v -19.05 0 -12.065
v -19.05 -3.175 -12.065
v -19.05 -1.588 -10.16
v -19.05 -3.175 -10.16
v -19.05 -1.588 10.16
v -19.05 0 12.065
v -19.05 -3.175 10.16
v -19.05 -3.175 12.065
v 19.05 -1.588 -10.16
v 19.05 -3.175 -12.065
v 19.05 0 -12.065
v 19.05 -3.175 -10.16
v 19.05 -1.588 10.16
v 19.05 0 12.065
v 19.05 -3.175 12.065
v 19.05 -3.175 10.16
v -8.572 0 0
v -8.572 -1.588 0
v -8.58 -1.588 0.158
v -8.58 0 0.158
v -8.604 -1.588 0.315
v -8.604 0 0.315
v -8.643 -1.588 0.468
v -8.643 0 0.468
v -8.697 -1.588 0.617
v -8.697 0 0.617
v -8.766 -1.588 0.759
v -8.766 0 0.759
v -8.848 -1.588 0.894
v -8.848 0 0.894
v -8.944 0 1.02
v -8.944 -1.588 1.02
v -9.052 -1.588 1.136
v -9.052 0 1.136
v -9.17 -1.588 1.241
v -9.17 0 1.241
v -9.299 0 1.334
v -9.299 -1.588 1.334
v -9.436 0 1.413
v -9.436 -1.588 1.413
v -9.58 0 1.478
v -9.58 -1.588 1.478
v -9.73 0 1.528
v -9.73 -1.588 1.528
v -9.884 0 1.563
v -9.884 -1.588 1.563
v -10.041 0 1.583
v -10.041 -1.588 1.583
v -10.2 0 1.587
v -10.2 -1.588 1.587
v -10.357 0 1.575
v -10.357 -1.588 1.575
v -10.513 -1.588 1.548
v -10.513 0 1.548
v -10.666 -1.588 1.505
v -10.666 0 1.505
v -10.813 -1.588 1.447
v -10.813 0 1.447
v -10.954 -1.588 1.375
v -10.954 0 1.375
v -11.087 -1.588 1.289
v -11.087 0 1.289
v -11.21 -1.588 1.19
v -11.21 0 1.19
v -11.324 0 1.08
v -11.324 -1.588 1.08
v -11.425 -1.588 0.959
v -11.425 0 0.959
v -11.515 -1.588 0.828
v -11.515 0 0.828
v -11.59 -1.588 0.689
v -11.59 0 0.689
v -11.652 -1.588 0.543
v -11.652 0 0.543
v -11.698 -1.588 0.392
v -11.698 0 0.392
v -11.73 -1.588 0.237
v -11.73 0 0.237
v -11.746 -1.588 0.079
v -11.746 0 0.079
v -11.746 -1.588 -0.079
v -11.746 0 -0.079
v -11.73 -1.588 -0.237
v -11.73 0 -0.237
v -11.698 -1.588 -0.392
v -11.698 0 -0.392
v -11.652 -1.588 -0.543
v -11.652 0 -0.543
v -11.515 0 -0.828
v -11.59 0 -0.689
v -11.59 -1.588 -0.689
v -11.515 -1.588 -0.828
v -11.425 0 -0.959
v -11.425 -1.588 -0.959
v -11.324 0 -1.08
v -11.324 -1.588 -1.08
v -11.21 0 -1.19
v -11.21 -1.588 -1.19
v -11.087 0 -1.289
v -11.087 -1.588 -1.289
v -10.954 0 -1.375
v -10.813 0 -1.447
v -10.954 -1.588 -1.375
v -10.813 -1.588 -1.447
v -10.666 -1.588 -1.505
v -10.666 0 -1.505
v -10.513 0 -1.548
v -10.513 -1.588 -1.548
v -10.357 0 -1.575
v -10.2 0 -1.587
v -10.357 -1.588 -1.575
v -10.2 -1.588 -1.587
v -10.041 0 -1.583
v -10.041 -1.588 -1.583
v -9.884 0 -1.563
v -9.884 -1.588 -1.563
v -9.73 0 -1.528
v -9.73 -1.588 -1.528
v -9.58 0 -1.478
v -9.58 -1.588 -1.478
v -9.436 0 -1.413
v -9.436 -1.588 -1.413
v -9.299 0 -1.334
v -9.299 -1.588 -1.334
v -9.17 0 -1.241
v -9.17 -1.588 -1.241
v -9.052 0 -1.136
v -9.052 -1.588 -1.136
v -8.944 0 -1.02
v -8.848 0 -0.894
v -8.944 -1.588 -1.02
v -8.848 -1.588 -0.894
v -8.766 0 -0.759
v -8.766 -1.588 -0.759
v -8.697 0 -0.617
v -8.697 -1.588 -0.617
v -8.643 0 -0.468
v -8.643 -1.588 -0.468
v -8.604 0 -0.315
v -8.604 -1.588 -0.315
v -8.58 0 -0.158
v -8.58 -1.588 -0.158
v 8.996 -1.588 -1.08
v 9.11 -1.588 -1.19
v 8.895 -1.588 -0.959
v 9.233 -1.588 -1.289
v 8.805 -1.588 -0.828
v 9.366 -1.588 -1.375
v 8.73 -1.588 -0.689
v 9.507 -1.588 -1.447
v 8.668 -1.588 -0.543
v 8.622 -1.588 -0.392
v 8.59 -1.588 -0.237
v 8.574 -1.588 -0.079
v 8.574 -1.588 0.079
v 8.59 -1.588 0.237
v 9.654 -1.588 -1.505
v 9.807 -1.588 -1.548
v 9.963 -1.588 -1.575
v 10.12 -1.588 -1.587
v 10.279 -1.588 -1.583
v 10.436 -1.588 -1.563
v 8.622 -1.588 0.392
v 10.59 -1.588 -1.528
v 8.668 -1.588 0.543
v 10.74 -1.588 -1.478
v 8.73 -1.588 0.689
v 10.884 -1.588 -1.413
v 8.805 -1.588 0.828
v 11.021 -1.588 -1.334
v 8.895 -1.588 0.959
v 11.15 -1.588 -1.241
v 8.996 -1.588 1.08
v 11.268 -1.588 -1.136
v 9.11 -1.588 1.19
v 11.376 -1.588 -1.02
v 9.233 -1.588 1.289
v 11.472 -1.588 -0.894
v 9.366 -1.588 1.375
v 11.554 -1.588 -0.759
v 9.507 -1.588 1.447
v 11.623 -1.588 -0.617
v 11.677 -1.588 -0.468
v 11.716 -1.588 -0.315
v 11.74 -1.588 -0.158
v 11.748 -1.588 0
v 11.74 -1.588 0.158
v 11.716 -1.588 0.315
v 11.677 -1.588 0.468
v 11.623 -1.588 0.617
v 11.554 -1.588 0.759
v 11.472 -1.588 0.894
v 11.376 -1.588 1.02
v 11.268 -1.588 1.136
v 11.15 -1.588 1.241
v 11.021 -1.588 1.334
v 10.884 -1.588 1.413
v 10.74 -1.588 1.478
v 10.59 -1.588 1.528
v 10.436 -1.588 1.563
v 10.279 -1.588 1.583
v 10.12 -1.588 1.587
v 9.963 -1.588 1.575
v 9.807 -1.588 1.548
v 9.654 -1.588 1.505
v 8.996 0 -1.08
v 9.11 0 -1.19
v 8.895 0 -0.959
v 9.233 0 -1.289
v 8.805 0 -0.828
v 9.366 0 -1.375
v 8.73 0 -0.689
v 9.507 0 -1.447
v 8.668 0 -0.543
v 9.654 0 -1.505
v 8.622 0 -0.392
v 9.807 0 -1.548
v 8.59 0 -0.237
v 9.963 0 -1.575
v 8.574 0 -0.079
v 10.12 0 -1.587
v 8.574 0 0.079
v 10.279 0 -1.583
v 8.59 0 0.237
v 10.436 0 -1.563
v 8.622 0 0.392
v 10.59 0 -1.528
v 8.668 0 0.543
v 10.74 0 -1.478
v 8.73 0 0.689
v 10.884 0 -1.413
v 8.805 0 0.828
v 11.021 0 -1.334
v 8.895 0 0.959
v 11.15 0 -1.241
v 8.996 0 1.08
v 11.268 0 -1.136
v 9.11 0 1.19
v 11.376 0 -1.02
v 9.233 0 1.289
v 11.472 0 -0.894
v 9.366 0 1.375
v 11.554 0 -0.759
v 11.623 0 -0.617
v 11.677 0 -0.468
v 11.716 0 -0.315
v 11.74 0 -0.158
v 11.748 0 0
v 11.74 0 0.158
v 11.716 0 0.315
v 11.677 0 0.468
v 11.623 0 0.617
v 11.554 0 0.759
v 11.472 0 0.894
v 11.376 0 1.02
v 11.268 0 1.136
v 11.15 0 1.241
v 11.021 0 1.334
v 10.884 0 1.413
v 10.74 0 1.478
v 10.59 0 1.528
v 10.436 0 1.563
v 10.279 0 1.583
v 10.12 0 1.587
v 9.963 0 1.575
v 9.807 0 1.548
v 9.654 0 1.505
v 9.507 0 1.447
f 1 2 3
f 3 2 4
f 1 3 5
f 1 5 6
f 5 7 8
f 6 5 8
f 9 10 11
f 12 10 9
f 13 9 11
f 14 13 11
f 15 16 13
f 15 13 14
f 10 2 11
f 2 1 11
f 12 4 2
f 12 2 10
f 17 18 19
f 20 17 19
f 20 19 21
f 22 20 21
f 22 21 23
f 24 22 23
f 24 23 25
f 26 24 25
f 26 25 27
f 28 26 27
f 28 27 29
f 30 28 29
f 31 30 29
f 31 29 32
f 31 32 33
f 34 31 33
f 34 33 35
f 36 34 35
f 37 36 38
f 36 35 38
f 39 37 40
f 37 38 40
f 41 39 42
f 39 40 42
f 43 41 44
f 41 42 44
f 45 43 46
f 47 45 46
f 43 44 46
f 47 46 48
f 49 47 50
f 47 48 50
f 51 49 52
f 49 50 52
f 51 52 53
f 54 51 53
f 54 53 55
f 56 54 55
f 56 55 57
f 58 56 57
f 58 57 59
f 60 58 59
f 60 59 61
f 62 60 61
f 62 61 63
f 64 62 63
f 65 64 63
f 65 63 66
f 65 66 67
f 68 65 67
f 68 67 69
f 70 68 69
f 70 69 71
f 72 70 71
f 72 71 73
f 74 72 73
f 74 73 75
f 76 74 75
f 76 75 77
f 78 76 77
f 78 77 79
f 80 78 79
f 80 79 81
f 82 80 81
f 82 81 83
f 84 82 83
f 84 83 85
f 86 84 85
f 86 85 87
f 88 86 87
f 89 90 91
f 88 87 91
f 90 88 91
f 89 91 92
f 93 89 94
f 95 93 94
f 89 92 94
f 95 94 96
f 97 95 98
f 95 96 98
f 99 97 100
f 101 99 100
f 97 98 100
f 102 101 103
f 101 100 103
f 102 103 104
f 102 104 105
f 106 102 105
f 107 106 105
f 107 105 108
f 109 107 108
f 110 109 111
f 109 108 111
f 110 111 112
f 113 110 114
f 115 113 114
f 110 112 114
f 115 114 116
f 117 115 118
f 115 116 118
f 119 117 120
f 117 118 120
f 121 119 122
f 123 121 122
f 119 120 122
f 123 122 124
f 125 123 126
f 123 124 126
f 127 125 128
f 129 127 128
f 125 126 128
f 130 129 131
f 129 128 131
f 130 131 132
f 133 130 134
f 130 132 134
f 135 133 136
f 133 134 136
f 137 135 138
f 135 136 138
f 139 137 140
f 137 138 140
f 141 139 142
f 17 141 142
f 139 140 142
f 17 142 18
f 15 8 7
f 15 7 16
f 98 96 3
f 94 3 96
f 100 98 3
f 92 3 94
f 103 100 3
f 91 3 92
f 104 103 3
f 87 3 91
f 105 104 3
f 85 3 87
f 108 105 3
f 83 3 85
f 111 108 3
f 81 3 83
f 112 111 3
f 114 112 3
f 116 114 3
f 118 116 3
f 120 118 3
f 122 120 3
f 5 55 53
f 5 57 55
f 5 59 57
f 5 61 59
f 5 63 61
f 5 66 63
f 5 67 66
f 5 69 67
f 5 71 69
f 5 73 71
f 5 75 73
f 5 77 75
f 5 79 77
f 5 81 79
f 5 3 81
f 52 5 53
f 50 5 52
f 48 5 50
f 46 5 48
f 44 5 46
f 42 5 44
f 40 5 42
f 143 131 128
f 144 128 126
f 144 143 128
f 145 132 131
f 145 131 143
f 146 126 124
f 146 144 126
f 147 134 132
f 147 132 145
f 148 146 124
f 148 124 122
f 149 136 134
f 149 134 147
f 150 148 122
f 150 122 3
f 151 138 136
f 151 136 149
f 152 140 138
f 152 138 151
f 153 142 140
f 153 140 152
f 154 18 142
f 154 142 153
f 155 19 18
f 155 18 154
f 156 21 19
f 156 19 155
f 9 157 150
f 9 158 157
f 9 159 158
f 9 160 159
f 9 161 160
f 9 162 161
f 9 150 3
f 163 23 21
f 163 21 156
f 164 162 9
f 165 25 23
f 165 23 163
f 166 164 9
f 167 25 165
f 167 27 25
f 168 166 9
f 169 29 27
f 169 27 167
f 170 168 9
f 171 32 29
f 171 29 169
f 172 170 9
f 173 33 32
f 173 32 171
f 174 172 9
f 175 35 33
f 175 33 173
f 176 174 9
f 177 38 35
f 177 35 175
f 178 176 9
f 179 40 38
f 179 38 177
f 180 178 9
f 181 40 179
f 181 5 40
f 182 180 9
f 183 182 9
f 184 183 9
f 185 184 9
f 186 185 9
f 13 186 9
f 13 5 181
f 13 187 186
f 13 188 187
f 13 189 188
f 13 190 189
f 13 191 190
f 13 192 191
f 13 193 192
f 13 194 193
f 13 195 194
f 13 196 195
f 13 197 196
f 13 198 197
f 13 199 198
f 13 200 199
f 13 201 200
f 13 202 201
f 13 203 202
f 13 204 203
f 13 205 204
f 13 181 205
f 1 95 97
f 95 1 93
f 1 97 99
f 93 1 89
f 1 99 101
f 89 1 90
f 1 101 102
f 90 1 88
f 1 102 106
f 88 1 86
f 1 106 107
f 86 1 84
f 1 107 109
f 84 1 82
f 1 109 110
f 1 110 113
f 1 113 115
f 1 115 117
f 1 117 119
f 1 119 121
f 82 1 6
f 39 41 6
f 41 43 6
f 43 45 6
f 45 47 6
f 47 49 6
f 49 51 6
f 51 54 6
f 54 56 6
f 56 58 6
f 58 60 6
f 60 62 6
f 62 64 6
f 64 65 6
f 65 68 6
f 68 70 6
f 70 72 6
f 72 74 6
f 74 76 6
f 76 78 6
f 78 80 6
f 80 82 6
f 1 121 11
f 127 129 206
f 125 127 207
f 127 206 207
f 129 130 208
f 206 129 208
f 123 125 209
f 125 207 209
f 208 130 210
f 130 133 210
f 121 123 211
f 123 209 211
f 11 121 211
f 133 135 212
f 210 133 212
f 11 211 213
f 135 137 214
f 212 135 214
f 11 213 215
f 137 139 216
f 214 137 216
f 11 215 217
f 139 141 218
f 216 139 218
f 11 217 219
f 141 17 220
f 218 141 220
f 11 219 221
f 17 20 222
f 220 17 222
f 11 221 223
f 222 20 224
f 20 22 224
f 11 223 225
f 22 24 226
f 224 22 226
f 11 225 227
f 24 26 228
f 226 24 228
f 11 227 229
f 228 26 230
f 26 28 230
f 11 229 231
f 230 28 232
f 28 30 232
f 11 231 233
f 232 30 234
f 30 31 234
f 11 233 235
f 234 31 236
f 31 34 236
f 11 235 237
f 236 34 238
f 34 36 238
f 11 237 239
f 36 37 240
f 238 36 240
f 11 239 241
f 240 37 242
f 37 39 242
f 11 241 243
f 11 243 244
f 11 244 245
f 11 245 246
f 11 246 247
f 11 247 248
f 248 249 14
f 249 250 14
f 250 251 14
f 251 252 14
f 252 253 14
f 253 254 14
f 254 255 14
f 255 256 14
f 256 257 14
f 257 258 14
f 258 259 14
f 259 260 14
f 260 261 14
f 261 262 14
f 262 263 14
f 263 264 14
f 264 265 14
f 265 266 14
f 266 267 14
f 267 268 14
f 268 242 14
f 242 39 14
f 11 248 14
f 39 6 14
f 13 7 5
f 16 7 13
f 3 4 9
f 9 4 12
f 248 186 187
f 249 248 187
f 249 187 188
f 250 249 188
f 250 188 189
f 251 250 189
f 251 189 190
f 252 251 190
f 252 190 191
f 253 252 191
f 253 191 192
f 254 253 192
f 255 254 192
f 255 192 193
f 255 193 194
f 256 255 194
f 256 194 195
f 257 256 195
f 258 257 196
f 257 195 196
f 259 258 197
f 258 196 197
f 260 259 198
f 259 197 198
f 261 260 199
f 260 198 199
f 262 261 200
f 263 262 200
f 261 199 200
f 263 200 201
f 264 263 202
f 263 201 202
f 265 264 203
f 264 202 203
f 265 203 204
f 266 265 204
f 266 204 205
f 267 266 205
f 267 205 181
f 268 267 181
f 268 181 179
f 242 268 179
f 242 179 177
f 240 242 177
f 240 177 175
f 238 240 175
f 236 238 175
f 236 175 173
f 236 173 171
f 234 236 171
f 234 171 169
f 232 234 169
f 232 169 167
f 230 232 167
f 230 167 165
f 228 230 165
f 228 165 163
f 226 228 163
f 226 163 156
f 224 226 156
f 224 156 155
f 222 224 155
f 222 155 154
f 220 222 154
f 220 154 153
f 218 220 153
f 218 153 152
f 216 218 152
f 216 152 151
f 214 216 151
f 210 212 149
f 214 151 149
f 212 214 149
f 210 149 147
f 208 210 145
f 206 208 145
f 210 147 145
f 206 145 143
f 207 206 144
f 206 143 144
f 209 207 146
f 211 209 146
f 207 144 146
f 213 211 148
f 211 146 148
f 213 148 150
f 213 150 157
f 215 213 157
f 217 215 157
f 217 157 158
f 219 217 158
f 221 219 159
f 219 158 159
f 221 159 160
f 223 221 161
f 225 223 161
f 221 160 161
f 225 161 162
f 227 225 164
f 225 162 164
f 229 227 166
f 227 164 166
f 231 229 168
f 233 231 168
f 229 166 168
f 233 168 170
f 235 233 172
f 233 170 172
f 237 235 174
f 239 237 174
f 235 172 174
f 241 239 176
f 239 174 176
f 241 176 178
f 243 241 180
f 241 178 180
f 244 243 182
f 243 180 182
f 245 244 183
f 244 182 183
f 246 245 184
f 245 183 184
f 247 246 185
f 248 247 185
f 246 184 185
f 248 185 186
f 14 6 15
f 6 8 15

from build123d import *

# Parameters (mm, degrees)
F0_W     = 38.1
F0_H     = 19.05
F1_DEPTH = 1.5875
F2_R     = 1.5875
F3_DEPTH = 1.5885
F4_W     = 38.1
F4_H     = 2.54
F5_DEPTH = 1.5875
F6_W     = 38.1
F6_H     = 0.635
F7_DEPTH = 1.5875
F8_W     = 38.1
F8_H     = 0.635
F9_DEPTH = 1.5875


with BuildPart() as f1:
    # F0 (on Front) → F1 (new body)
    with BuildSketch(Plane.XZ):
        Rectangle(F0_W, F0_H)
    extrude(amount=F1_DEPTH)

    # F2 (on face) → F3 (cut, through all)
    with BuildSketch(Plane.XZ.offset(1.5875)):
        with Locations((-10.16, 0)):
            Circle(F2_R)
        with Locations((10.16, 0)):
            Circle(F2_R)
    extrude(amount=-F3_DEPTH, mode=Mode.SUBTRACT)

    # F4 (on face) → F5 (join, symmetric)
    with BuildSketch(Plane.XZ.offset(1.5875)):
        with Locations((0, -10.795)):
            Rectangle(F4_W, F4_H)
        with Locations((0, 10.795)):
            Rectangle(F4_W, F4_H)
    extrude(amount=F5_DEPTH, both=True)

    # F6 (on face) → F7 (cut)
    with BuildSketch(Plane.XZ.offset(3.175)):
        with Locations((0, 9.8425)):
            Rectangle(F6_W, F6_H)
    extrude(amount=-F7_DEPTH, mode=Mode.SUBTRACT)

    # F8 (on face) → F9 (cut)
    with BuildSketch(Plane.XZ.offset(3.175)):
        with Locations((0, -9.8425)):
            Rectangle(F8_W, F8_H)
    extrude(amount=-F9_DEPTH, mode=Mode.SUBTRACT)


solid = f1.part
